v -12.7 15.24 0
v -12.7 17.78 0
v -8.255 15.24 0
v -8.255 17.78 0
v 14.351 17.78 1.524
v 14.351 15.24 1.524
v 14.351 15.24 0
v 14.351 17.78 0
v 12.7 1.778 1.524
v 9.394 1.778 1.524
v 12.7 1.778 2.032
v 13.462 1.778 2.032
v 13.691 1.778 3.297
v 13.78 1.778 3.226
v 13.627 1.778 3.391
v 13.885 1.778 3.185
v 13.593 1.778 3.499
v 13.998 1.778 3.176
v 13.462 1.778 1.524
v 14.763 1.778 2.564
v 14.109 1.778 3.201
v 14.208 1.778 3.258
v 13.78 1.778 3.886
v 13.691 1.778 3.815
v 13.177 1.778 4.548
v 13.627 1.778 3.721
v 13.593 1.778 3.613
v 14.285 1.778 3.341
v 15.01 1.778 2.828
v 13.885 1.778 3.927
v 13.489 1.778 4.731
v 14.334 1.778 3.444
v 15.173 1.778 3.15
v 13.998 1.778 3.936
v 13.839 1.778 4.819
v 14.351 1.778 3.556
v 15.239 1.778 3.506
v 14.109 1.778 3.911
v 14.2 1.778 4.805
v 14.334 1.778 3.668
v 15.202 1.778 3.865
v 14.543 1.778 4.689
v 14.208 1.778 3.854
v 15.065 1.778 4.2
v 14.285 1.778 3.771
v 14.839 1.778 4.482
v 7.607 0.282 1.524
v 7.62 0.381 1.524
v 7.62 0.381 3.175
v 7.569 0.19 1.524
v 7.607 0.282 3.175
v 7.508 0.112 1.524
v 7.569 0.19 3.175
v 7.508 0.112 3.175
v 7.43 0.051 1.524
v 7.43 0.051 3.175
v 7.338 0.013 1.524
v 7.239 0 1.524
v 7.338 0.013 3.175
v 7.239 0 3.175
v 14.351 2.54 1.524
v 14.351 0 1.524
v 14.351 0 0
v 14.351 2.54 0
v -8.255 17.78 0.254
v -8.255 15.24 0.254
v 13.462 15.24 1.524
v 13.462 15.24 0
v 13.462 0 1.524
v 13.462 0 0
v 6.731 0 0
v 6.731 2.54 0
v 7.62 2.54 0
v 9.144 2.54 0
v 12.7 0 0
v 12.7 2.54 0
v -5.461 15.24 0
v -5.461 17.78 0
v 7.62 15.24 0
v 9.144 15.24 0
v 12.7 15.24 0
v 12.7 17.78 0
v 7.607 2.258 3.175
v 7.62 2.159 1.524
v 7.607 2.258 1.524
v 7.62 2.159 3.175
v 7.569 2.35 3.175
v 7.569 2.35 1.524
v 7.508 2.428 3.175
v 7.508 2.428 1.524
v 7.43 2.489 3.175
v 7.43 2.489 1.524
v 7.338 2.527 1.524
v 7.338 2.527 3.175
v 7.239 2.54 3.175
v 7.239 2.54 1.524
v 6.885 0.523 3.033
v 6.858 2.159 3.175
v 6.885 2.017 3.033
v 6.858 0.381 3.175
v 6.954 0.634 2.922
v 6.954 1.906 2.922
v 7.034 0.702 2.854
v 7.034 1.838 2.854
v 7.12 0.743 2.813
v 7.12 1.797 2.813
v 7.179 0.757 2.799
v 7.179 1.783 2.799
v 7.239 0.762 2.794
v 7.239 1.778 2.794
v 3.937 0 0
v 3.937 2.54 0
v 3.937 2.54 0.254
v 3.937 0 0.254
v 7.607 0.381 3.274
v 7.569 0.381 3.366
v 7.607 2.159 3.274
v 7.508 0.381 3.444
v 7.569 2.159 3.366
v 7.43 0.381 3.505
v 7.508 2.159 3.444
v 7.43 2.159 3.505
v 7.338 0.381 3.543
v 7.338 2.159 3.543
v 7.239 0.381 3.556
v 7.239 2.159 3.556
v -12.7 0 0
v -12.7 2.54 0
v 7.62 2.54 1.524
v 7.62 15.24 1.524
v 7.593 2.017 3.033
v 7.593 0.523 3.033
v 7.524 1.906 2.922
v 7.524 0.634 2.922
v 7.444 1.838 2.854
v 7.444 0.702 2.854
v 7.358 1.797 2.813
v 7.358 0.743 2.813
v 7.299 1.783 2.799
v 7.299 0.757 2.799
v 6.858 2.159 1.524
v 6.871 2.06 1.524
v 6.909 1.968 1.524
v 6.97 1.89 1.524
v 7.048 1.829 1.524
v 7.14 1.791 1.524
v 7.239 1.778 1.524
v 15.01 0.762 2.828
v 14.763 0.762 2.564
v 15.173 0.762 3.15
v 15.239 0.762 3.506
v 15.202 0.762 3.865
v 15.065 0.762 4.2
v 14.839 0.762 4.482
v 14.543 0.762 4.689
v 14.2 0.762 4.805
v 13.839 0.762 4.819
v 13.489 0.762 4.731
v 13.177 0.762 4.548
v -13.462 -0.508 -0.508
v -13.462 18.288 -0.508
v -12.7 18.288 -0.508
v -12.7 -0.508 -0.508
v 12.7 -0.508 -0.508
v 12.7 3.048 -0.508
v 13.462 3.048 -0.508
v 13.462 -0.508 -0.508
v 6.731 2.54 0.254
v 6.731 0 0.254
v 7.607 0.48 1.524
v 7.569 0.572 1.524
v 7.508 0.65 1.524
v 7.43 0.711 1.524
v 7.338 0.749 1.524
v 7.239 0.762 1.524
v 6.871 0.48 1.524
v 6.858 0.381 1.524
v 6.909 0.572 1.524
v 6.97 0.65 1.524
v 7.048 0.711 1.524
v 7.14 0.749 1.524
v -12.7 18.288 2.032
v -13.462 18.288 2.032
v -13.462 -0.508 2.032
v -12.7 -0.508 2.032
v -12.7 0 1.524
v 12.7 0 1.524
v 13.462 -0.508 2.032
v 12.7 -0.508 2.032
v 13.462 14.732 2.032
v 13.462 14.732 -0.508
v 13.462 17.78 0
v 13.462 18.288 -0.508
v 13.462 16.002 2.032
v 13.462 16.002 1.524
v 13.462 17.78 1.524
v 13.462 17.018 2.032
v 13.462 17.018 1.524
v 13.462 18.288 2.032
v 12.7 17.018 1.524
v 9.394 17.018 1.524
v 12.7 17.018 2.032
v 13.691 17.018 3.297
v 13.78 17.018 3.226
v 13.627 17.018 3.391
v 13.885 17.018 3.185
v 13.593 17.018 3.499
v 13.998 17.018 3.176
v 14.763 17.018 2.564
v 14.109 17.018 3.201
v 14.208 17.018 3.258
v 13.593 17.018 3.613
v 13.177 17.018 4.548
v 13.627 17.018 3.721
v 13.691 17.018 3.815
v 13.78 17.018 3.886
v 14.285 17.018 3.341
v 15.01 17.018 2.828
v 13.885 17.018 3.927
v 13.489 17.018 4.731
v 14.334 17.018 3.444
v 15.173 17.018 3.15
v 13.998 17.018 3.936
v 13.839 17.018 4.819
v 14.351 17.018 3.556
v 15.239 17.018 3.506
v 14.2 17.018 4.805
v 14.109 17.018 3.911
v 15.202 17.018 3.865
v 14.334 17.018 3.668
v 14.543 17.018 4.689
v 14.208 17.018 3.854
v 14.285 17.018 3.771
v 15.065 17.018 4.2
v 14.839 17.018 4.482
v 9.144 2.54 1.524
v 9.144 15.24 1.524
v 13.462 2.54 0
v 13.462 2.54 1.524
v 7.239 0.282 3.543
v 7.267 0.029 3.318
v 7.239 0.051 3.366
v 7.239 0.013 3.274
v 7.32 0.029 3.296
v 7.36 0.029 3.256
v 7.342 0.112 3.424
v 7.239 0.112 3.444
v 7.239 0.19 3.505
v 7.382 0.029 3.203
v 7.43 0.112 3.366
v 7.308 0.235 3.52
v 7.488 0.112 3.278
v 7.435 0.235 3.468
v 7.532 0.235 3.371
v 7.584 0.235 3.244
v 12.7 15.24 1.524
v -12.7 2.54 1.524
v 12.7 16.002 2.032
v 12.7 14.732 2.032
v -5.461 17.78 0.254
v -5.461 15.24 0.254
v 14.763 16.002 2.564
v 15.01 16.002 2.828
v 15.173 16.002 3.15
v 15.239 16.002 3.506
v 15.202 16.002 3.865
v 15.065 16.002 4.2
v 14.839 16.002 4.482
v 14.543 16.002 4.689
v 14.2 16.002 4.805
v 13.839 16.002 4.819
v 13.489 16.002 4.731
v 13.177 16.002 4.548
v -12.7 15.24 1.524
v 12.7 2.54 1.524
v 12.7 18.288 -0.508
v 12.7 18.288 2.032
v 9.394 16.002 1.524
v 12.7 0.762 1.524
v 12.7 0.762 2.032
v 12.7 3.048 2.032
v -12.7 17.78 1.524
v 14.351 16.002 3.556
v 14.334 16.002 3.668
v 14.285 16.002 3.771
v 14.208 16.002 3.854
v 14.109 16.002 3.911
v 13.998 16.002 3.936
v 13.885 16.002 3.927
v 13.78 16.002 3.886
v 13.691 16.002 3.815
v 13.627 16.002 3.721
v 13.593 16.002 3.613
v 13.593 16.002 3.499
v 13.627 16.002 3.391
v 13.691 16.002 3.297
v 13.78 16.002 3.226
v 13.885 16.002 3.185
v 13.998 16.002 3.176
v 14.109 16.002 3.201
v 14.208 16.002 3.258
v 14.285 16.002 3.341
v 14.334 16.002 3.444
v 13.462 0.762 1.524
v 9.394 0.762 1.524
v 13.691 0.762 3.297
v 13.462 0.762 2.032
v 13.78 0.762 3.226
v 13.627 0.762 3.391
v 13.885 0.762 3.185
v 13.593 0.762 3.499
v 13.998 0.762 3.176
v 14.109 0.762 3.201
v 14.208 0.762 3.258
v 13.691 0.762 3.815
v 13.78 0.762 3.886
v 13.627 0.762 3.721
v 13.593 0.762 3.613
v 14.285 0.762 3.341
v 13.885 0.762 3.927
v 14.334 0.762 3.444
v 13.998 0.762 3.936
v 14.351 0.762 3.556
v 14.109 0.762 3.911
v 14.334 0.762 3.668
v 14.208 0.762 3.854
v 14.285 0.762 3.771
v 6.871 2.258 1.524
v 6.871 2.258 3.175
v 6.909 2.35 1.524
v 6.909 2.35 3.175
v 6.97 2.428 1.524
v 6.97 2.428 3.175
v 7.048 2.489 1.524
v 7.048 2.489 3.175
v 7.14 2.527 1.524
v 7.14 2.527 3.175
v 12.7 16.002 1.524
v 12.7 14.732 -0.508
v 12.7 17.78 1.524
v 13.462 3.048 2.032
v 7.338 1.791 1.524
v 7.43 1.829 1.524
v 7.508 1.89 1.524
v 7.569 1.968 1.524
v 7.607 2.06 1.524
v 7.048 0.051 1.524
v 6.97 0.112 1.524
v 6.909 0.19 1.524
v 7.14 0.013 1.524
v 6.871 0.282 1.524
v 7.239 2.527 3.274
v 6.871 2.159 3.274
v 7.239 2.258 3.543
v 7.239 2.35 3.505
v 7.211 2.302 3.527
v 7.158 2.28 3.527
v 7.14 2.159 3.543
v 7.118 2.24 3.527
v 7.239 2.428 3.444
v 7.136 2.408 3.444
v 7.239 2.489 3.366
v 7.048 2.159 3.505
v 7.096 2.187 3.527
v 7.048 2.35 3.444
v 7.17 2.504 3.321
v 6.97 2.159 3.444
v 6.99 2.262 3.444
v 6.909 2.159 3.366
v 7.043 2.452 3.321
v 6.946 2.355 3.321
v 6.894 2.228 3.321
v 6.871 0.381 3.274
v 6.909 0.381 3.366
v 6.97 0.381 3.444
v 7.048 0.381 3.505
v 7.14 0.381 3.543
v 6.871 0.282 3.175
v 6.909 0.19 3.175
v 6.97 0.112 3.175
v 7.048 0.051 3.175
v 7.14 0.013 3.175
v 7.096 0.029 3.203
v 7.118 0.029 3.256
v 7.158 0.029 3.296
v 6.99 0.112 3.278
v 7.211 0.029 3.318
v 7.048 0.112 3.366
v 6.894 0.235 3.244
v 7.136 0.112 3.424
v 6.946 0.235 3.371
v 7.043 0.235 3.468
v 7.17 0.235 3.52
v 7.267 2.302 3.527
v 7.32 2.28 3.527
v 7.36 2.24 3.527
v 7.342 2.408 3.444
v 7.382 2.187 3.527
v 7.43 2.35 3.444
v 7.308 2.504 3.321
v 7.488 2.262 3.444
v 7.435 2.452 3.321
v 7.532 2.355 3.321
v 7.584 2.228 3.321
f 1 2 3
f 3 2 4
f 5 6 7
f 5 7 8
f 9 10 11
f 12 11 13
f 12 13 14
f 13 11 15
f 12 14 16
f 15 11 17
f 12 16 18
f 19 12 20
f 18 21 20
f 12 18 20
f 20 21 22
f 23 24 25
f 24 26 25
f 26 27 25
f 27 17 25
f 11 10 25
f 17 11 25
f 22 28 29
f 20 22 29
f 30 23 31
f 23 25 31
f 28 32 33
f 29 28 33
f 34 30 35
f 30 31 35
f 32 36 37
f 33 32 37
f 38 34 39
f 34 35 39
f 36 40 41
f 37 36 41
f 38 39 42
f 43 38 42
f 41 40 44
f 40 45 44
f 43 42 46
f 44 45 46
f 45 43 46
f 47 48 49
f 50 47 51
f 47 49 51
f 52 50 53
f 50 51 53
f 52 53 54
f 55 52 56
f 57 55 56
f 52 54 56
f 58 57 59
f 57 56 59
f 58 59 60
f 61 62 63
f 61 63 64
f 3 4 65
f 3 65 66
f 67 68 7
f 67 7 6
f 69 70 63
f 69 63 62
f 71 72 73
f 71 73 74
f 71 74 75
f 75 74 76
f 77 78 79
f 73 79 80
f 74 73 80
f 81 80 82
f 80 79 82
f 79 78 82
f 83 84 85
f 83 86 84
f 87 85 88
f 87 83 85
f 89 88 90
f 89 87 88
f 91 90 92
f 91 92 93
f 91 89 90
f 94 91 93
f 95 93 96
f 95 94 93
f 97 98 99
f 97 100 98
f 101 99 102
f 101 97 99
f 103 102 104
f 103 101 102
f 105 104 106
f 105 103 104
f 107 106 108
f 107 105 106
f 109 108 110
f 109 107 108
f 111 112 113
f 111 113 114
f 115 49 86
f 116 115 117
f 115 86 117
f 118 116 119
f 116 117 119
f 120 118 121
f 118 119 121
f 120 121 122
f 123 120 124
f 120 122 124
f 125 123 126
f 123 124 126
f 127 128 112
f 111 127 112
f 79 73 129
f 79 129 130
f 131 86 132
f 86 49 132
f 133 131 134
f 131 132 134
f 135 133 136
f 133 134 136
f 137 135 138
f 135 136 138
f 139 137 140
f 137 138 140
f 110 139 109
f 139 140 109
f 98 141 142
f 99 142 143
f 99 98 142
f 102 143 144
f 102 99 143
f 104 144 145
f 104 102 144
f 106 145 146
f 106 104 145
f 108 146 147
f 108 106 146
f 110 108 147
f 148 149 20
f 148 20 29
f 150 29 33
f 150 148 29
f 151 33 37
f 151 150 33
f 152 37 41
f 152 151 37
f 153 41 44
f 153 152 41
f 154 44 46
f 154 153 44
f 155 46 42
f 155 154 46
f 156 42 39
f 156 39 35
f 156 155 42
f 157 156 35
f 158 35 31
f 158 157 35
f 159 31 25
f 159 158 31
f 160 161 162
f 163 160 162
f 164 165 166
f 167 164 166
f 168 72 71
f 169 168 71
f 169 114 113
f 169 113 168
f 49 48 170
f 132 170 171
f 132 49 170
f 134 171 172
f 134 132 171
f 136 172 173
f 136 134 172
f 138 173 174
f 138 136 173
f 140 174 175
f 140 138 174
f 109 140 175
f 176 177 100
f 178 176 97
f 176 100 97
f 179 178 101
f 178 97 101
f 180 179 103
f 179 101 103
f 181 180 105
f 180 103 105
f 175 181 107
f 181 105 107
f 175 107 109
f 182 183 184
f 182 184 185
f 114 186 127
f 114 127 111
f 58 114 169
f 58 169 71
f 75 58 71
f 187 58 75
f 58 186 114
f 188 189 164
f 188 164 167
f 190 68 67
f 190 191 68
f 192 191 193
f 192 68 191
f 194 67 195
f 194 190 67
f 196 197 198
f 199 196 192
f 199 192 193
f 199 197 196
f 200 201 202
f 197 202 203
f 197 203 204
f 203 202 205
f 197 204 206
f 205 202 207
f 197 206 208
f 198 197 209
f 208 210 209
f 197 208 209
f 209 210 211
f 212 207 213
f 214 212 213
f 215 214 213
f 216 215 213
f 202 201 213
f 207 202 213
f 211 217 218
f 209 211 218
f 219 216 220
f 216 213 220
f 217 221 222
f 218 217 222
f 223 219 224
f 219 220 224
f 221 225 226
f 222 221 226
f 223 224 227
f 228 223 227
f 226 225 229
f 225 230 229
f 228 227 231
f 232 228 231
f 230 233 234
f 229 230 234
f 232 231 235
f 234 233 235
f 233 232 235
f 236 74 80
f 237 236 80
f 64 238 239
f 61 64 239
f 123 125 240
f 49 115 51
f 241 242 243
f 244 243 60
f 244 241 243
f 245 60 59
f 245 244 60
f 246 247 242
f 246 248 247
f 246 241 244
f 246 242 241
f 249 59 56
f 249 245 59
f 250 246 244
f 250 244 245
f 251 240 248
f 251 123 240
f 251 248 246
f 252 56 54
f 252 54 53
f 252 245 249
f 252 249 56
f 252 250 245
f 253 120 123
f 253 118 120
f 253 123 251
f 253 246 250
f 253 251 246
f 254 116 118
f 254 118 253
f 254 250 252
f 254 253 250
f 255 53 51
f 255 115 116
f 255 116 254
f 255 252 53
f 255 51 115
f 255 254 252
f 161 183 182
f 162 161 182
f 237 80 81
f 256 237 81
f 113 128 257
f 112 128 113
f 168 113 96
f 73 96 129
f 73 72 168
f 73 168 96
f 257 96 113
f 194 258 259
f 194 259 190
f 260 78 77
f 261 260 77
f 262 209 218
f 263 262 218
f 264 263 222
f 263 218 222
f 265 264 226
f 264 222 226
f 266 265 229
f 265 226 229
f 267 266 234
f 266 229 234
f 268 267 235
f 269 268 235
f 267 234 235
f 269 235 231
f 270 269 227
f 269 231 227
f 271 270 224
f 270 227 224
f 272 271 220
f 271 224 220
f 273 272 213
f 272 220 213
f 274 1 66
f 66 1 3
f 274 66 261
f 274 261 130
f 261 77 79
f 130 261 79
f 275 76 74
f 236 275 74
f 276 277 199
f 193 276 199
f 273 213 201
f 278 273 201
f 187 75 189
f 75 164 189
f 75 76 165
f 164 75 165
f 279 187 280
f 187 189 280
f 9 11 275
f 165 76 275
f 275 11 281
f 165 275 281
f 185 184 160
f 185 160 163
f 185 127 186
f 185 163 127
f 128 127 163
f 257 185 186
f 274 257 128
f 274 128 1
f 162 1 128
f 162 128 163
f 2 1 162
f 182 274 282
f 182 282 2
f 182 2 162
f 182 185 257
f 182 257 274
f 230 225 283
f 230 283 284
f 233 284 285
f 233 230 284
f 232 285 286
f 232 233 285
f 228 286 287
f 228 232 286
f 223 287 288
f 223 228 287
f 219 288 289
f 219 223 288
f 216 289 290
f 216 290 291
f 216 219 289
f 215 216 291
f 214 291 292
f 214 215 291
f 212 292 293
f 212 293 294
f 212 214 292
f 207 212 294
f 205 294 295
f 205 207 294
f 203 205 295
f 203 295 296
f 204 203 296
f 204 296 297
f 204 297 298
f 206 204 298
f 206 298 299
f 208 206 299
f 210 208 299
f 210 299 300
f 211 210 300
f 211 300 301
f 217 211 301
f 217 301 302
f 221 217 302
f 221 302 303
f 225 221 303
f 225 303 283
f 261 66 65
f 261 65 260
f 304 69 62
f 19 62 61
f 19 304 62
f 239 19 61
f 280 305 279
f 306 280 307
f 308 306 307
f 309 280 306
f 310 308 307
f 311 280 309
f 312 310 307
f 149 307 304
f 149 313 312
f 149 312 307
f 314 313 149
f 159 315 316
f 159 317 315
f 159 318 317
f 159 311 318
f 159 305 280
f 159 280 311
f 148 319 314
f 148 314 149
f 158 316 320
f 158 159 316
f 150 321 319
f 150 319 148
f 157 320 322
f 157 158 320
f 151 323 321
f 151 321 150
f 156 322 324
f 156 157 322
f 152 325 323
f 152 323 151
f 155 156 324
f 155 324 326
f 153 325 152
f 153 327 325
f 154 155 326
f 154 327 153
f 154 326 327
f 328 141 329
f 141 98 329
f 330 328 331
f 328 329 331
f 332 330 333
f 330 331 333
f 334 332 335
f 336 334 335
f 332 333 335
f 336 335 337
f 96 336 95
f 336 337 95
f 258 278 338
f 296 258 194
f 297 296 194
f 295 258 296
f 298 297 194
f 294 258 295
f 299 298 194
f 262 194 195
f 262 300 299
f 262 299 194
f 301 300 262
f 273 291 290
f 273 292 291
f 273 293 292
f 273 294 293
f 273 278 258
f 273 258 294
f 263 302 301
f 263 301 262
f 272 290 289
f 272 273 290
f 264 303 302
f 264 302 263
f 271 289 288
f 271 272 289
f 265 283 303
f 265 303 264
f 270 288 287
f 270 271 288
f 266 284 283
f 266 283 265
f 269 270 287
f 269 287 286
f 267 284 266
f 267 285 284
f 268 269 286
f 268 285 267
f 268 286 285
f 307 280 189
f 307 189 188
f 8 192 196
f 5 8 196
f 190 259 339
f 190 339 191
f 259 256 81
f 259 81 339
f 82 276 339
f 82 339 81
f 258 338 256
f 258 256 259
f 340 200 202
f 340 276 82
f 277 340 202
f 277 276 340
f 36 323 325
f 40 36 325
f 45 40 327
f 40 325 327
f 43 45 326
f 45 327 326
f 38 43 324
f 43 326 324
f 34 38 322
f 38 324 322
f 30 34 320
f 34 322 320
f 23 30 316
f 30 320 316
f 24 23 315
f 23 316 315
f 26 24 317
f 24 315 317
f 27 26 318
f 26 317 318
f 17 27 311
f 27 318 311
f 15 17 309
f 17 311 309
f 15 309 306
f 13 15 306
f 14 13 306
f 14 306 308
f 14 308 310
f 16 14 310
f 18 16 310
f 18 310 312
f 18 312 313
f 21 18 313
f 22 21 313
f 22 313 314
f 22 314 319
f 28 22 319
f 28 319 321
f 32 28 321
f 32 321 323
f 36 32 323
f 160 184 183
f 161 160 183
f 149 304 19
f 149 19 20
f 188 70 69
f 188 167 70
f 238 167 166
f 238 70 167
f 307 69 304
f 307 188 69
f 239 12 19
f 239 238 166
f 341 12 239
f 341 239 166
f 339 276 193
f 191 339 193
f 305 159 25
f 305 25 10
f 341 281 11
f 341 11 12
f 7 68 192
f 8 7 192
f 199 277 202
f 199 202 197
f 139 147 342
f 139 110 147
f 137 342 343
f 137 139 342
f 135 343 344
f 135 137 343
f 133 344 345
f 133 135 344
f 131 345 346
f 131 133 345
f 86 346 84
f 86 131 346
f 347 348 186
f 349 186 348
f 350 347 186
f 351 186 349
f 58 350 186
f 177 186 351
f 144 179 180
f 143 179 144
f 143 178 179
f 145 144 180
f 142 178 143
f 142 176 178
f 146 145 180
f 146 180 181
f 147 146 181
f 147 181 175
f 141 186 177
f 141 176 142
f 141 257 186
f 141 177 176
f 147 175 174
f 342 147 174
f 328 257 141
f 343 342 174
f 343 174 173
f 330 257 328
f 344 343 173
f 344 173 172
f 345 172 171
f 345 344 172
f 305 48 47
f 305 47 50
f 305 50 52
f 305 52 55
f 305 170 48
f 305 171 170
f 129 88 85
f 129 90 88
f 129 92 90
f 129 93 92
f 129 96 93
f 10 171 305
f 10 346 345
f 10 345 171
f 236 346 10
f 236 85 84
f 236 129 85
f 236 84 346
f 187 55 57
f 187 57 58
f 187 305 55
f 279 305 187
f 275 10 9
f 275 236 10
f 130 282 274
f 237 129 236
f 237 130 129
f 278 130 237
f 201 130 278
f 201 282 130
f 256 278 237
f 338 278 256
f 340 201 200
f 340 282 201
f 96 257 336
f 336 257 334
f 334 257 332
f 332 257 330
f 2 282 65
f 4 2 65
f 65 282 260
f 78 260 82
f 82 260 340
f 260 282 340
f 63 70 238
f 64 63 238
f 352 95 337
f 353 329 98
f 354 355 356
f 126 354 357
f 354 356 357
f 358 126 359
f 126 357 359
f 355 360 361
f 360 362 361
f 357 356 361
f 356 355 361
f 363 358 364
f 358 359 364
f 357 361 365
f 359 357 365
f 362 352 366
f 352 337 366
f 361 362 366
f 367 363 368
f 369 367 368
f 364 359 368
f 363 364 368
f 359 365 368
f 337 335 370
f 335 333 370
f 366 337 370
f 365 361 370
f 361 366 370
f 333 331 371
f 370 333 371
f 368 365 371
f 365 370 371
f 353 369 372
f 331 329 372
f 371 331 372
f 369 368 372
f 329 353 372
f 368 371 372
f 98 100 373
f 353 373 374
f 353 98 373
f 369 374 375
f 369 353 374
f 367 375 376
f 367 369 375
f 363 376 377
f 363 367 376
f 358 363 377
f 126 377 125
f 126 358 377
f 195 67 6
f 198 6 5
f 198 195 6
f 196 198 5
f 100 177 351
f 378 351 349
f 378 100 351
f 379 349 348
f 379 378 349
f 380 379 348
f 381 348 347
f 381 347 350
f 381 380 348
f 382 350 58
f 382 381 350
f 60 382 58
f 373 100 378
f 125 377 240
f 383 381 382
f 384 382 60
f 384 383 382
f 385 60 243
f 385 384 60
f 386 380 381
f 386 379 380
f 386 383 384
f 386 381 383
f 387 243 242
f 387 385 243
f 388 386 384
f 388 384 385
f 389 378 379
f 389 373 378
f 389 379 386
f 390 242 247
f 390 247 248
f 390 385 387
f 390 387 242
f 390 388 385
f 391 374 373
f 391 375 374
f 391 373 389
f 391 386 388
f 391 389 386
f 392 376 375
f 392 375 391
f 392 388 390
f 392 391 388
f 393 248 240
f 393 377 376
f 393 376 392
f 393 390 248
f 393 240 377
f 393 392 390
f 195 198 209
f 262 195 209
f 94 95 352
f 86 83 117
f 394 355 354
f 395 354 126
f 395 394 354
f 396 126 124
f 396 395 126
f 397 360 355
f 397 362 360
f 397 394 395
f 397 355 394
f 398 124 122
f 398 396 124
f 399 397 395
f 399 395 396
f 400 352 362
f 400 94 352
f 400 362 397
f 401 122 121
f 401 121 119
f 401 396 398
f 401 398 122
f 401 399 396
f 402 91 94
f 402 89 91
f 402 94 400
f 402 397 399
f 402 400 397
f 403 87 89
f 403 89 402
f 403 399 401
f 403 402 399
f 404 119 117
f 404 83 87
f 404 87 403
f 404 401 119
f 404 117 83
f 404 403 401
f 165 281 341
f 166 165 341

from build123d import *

# Parameters (mm, degrees)
F0_W          = 1.524
F0_H          = 12.7
F1_DEPTH      = 1.524
F2_W          = 0.762
F2_H          = 18.796
F2_H_2        = 3.556
F3_DEPTH      = 0.508
F3_DEPTH_BACK = 2.032
F4_R          = 0.381
F5_DEPTH      = 1.778
F7_DEPTH      = 0.762
F9_W          = 2.794
F9_H          = 2.54
F10_DEPTH     = 0.254
F11_W         = 2.54
F11_H         = 1.524
F12_DEPTH     = 0.889
F13_W         = 2.54
F13_H         = 1.524
F14_DEPTH     = 0.889
F15_W         = 0.762
F15_H         = 0.762
F16_DEPTH     = 2.032
F17_W         = 0.762
F17_H         = 0.762
F18_DEPTH     = 1.016
F19_R         = 0.38099


# Not quite as in the source:
# - a fillet or chamfer is up to 0.001 mm smaller than in the source, because OpenCascade refuses the exact size
# - a pattern or mirror of a feature is missing from the dataset's text; its kind, count and spacing are read off the source's solid


with BuildPart() as f1:
    # F0 (on Top) → F1 (new body)
    with BuildSketch(Plane.XY):
        Polygon((-12.7, 17.78), (-12.7, 15.24), (7.62, 15.24), (9.144, 15.24), (12.7, 15.24), (12.7, 17.78), align=None)
        Polygon((-12.7, 0), (-12.7, 2.54), (-12.7, 15.24), (-12.7, 17.78), (-12.7, 18.288), (-13.462, 18.288), (-13.462, -0.508), (-12.7, -0.508), align=None)
        Polygon((7.62, 2.54), (-12.7, 2.54), (-12.7, 0), (12.7, 0), (12.7, 2.54), (9.144, 2.54), align=None)
        with Locations((8.382, 8.89)):
            Rectangle(F0_W, F0_H)
        Polygon((12.7, 2.54), (12.7, 0), (12.7, -0.508), (13.462, -0.508), (13.462, 3.048), (12.7, 3.048), align=None)
        Polygon((12.7, 18.288), (12.7, 17.78), (12.7, 15.24), (12.7, 14.732), (13.462, 14.732), (13.462, 18.288), align=None)
    extrude(amount=F1_DEPTH)

    # F2 (on face) → F3 (join, two sides)
    with BuildSketch(Plane.XY.offset(1.524)) as f3_sk:
        with Locations((-13.081, 8.89)):
            Rectangle(F2_W, F2_H)
        with Locations((13.081, 16.51)):
            Rectangle(F2_W, F2_H_2)
        with Locations((13.081, 1.27)):
            Rectangle(F2_W, F2_H_2)
    extrude(amount=F3_DEPTH)
    extrude(f3_sk.sketch, amount=-F3_DEPTH_BACK)

    # F4 (on face) → F5 (join)
    with BuildSketch(Plane.XZ):
        with BuildLine():
            Line((13.462, 1.524), (14.762993756, 2.564001561))
            ThreePointArc((14.762993756, 2.564001561), (14.961998439, 4.348993756), (13.177006244, 4.547998439))
            Line((13.177006244, 4.547998439), (9.3941243381, 1.524))
            Line((9.3941243381, 1.524), (13.462, 1.524))
        make_face()
        with Locations((13.97, 3.556)):
            Circle(F4_R, mode=Mode.SUBTRACT)
    f5 = extrude(amount=-F5_DEPTH)

    # F5_copies: F5 across plane
    add(f5.mirror(Plane.ZX.offset(8.89)))

    # F6 (on face) → F7 (cut)
    with BuildSketch(Plane.XZ):
        with BuildLine():
            Line((13.177006244, 4.547998439), (9.3941243381, 1.524))
            Line((9.3941243381, 1.524), (12.7, 1.524))
            Line((12.7, 1.524), (12.7, 2.032))
            Line((12.7, 2.032), (13.462, 2.032))
            Line((13.462, 2.032), (13.462, 1.524))
            Line((13.462, 1.524), (14.762993756, 2.564001561))
            ThreePointArc((14.762993756, 2.564001561), (14.961998439, 4.348993756), (13.177006244, 4.547998439))
        make_face()
    f7 = extrude(amount=-F7_DEPTH, mode=Mode.SUBTRACT)

    # F7_copies: F7 across plane
    add(f7.mirror(Plane.ZX.offset(8.89)), mode=Mode.SUBTRACT)

    # F9 (on face) → F10 (cut)
    with BuildSketch(Plane(origin=(0, 0, 0), x_dir=(1, 0, 0), z_dir=(0, 0, -1))):
        with Locations((5.334, -1.27)):
            Rectangle(F9_W, F9_H)
        with Locations((-6.858, -16.51)):
            Rectangle(F9_W, F9_H)
    extrude(amount=-F10_DEPTH, mode=Mode.SUBTRACT)

    # F11 (on face) → F12 (join)
    with BuildSketch(Plane.YZ.offset(13.462)):
        with Locations((1.27, 0.762)):
            Rectangle(F11_W, F11_H)
    extrude(amount=F12_DEPTH)

    # F13 (on face) → F14 (join)
    with BuildSketch(Plane.YZ.offset(13.462)):
        with Locations((16.51, 0.762)):
            Rectangle(F13_W, F13_H)
    extrude(amount=F14_DEPTH)

    # F15 (on face) → F16 (join)
    with BuildSketch(Plane.XY.offset(1.524)):
        with Locations((7.239, 2.159)):
            Rectangle(F15_W, F15_H)
        with Locations((7.239, 0.381)):
            Rectangle(F15_W, F15_H)
    extrude(amount=F16_DEPTH)

    # F17 (on face) → F18 (join, through all)
    with BuildSketch(Plane.XZ.offset(-1.778)):
        with Locations((7.239, 3.175)):
            Rectangle(F17_W, F17_H)
    extrude(amount=F18_DEPTH)

    # F19 (radius 0.381 in the source; OpenCascade refuses exactly that, so slightly less here)
    f19_edges = [f1.edges().sort_by_distance(p)[0] for p in [
        (6.858, 2.54, 2.54),
        (7.62, 2.54, 2.54),
        (7.239, 2.54, 3.556),
        (7.62, 1.27, 3.556),
        (6.858, 1.27, 3.556),
        (6.858, 1.27, 2.794),
        (6.858, 1.778, 2.159),
        (6.858, 0.762, 2.159),
        (7.62, 0.762, 2.159),
        (6.858, 0, 2.54),
        (7.239, 0, 3.556),
        (7.62, 1.27, 2.794),
        (7.62, 0, 2.54),
        (7.62, 1.778, 2.159),
    ]]
    fillet(f19_edges, radius=F19_R)


solid = f1.part
